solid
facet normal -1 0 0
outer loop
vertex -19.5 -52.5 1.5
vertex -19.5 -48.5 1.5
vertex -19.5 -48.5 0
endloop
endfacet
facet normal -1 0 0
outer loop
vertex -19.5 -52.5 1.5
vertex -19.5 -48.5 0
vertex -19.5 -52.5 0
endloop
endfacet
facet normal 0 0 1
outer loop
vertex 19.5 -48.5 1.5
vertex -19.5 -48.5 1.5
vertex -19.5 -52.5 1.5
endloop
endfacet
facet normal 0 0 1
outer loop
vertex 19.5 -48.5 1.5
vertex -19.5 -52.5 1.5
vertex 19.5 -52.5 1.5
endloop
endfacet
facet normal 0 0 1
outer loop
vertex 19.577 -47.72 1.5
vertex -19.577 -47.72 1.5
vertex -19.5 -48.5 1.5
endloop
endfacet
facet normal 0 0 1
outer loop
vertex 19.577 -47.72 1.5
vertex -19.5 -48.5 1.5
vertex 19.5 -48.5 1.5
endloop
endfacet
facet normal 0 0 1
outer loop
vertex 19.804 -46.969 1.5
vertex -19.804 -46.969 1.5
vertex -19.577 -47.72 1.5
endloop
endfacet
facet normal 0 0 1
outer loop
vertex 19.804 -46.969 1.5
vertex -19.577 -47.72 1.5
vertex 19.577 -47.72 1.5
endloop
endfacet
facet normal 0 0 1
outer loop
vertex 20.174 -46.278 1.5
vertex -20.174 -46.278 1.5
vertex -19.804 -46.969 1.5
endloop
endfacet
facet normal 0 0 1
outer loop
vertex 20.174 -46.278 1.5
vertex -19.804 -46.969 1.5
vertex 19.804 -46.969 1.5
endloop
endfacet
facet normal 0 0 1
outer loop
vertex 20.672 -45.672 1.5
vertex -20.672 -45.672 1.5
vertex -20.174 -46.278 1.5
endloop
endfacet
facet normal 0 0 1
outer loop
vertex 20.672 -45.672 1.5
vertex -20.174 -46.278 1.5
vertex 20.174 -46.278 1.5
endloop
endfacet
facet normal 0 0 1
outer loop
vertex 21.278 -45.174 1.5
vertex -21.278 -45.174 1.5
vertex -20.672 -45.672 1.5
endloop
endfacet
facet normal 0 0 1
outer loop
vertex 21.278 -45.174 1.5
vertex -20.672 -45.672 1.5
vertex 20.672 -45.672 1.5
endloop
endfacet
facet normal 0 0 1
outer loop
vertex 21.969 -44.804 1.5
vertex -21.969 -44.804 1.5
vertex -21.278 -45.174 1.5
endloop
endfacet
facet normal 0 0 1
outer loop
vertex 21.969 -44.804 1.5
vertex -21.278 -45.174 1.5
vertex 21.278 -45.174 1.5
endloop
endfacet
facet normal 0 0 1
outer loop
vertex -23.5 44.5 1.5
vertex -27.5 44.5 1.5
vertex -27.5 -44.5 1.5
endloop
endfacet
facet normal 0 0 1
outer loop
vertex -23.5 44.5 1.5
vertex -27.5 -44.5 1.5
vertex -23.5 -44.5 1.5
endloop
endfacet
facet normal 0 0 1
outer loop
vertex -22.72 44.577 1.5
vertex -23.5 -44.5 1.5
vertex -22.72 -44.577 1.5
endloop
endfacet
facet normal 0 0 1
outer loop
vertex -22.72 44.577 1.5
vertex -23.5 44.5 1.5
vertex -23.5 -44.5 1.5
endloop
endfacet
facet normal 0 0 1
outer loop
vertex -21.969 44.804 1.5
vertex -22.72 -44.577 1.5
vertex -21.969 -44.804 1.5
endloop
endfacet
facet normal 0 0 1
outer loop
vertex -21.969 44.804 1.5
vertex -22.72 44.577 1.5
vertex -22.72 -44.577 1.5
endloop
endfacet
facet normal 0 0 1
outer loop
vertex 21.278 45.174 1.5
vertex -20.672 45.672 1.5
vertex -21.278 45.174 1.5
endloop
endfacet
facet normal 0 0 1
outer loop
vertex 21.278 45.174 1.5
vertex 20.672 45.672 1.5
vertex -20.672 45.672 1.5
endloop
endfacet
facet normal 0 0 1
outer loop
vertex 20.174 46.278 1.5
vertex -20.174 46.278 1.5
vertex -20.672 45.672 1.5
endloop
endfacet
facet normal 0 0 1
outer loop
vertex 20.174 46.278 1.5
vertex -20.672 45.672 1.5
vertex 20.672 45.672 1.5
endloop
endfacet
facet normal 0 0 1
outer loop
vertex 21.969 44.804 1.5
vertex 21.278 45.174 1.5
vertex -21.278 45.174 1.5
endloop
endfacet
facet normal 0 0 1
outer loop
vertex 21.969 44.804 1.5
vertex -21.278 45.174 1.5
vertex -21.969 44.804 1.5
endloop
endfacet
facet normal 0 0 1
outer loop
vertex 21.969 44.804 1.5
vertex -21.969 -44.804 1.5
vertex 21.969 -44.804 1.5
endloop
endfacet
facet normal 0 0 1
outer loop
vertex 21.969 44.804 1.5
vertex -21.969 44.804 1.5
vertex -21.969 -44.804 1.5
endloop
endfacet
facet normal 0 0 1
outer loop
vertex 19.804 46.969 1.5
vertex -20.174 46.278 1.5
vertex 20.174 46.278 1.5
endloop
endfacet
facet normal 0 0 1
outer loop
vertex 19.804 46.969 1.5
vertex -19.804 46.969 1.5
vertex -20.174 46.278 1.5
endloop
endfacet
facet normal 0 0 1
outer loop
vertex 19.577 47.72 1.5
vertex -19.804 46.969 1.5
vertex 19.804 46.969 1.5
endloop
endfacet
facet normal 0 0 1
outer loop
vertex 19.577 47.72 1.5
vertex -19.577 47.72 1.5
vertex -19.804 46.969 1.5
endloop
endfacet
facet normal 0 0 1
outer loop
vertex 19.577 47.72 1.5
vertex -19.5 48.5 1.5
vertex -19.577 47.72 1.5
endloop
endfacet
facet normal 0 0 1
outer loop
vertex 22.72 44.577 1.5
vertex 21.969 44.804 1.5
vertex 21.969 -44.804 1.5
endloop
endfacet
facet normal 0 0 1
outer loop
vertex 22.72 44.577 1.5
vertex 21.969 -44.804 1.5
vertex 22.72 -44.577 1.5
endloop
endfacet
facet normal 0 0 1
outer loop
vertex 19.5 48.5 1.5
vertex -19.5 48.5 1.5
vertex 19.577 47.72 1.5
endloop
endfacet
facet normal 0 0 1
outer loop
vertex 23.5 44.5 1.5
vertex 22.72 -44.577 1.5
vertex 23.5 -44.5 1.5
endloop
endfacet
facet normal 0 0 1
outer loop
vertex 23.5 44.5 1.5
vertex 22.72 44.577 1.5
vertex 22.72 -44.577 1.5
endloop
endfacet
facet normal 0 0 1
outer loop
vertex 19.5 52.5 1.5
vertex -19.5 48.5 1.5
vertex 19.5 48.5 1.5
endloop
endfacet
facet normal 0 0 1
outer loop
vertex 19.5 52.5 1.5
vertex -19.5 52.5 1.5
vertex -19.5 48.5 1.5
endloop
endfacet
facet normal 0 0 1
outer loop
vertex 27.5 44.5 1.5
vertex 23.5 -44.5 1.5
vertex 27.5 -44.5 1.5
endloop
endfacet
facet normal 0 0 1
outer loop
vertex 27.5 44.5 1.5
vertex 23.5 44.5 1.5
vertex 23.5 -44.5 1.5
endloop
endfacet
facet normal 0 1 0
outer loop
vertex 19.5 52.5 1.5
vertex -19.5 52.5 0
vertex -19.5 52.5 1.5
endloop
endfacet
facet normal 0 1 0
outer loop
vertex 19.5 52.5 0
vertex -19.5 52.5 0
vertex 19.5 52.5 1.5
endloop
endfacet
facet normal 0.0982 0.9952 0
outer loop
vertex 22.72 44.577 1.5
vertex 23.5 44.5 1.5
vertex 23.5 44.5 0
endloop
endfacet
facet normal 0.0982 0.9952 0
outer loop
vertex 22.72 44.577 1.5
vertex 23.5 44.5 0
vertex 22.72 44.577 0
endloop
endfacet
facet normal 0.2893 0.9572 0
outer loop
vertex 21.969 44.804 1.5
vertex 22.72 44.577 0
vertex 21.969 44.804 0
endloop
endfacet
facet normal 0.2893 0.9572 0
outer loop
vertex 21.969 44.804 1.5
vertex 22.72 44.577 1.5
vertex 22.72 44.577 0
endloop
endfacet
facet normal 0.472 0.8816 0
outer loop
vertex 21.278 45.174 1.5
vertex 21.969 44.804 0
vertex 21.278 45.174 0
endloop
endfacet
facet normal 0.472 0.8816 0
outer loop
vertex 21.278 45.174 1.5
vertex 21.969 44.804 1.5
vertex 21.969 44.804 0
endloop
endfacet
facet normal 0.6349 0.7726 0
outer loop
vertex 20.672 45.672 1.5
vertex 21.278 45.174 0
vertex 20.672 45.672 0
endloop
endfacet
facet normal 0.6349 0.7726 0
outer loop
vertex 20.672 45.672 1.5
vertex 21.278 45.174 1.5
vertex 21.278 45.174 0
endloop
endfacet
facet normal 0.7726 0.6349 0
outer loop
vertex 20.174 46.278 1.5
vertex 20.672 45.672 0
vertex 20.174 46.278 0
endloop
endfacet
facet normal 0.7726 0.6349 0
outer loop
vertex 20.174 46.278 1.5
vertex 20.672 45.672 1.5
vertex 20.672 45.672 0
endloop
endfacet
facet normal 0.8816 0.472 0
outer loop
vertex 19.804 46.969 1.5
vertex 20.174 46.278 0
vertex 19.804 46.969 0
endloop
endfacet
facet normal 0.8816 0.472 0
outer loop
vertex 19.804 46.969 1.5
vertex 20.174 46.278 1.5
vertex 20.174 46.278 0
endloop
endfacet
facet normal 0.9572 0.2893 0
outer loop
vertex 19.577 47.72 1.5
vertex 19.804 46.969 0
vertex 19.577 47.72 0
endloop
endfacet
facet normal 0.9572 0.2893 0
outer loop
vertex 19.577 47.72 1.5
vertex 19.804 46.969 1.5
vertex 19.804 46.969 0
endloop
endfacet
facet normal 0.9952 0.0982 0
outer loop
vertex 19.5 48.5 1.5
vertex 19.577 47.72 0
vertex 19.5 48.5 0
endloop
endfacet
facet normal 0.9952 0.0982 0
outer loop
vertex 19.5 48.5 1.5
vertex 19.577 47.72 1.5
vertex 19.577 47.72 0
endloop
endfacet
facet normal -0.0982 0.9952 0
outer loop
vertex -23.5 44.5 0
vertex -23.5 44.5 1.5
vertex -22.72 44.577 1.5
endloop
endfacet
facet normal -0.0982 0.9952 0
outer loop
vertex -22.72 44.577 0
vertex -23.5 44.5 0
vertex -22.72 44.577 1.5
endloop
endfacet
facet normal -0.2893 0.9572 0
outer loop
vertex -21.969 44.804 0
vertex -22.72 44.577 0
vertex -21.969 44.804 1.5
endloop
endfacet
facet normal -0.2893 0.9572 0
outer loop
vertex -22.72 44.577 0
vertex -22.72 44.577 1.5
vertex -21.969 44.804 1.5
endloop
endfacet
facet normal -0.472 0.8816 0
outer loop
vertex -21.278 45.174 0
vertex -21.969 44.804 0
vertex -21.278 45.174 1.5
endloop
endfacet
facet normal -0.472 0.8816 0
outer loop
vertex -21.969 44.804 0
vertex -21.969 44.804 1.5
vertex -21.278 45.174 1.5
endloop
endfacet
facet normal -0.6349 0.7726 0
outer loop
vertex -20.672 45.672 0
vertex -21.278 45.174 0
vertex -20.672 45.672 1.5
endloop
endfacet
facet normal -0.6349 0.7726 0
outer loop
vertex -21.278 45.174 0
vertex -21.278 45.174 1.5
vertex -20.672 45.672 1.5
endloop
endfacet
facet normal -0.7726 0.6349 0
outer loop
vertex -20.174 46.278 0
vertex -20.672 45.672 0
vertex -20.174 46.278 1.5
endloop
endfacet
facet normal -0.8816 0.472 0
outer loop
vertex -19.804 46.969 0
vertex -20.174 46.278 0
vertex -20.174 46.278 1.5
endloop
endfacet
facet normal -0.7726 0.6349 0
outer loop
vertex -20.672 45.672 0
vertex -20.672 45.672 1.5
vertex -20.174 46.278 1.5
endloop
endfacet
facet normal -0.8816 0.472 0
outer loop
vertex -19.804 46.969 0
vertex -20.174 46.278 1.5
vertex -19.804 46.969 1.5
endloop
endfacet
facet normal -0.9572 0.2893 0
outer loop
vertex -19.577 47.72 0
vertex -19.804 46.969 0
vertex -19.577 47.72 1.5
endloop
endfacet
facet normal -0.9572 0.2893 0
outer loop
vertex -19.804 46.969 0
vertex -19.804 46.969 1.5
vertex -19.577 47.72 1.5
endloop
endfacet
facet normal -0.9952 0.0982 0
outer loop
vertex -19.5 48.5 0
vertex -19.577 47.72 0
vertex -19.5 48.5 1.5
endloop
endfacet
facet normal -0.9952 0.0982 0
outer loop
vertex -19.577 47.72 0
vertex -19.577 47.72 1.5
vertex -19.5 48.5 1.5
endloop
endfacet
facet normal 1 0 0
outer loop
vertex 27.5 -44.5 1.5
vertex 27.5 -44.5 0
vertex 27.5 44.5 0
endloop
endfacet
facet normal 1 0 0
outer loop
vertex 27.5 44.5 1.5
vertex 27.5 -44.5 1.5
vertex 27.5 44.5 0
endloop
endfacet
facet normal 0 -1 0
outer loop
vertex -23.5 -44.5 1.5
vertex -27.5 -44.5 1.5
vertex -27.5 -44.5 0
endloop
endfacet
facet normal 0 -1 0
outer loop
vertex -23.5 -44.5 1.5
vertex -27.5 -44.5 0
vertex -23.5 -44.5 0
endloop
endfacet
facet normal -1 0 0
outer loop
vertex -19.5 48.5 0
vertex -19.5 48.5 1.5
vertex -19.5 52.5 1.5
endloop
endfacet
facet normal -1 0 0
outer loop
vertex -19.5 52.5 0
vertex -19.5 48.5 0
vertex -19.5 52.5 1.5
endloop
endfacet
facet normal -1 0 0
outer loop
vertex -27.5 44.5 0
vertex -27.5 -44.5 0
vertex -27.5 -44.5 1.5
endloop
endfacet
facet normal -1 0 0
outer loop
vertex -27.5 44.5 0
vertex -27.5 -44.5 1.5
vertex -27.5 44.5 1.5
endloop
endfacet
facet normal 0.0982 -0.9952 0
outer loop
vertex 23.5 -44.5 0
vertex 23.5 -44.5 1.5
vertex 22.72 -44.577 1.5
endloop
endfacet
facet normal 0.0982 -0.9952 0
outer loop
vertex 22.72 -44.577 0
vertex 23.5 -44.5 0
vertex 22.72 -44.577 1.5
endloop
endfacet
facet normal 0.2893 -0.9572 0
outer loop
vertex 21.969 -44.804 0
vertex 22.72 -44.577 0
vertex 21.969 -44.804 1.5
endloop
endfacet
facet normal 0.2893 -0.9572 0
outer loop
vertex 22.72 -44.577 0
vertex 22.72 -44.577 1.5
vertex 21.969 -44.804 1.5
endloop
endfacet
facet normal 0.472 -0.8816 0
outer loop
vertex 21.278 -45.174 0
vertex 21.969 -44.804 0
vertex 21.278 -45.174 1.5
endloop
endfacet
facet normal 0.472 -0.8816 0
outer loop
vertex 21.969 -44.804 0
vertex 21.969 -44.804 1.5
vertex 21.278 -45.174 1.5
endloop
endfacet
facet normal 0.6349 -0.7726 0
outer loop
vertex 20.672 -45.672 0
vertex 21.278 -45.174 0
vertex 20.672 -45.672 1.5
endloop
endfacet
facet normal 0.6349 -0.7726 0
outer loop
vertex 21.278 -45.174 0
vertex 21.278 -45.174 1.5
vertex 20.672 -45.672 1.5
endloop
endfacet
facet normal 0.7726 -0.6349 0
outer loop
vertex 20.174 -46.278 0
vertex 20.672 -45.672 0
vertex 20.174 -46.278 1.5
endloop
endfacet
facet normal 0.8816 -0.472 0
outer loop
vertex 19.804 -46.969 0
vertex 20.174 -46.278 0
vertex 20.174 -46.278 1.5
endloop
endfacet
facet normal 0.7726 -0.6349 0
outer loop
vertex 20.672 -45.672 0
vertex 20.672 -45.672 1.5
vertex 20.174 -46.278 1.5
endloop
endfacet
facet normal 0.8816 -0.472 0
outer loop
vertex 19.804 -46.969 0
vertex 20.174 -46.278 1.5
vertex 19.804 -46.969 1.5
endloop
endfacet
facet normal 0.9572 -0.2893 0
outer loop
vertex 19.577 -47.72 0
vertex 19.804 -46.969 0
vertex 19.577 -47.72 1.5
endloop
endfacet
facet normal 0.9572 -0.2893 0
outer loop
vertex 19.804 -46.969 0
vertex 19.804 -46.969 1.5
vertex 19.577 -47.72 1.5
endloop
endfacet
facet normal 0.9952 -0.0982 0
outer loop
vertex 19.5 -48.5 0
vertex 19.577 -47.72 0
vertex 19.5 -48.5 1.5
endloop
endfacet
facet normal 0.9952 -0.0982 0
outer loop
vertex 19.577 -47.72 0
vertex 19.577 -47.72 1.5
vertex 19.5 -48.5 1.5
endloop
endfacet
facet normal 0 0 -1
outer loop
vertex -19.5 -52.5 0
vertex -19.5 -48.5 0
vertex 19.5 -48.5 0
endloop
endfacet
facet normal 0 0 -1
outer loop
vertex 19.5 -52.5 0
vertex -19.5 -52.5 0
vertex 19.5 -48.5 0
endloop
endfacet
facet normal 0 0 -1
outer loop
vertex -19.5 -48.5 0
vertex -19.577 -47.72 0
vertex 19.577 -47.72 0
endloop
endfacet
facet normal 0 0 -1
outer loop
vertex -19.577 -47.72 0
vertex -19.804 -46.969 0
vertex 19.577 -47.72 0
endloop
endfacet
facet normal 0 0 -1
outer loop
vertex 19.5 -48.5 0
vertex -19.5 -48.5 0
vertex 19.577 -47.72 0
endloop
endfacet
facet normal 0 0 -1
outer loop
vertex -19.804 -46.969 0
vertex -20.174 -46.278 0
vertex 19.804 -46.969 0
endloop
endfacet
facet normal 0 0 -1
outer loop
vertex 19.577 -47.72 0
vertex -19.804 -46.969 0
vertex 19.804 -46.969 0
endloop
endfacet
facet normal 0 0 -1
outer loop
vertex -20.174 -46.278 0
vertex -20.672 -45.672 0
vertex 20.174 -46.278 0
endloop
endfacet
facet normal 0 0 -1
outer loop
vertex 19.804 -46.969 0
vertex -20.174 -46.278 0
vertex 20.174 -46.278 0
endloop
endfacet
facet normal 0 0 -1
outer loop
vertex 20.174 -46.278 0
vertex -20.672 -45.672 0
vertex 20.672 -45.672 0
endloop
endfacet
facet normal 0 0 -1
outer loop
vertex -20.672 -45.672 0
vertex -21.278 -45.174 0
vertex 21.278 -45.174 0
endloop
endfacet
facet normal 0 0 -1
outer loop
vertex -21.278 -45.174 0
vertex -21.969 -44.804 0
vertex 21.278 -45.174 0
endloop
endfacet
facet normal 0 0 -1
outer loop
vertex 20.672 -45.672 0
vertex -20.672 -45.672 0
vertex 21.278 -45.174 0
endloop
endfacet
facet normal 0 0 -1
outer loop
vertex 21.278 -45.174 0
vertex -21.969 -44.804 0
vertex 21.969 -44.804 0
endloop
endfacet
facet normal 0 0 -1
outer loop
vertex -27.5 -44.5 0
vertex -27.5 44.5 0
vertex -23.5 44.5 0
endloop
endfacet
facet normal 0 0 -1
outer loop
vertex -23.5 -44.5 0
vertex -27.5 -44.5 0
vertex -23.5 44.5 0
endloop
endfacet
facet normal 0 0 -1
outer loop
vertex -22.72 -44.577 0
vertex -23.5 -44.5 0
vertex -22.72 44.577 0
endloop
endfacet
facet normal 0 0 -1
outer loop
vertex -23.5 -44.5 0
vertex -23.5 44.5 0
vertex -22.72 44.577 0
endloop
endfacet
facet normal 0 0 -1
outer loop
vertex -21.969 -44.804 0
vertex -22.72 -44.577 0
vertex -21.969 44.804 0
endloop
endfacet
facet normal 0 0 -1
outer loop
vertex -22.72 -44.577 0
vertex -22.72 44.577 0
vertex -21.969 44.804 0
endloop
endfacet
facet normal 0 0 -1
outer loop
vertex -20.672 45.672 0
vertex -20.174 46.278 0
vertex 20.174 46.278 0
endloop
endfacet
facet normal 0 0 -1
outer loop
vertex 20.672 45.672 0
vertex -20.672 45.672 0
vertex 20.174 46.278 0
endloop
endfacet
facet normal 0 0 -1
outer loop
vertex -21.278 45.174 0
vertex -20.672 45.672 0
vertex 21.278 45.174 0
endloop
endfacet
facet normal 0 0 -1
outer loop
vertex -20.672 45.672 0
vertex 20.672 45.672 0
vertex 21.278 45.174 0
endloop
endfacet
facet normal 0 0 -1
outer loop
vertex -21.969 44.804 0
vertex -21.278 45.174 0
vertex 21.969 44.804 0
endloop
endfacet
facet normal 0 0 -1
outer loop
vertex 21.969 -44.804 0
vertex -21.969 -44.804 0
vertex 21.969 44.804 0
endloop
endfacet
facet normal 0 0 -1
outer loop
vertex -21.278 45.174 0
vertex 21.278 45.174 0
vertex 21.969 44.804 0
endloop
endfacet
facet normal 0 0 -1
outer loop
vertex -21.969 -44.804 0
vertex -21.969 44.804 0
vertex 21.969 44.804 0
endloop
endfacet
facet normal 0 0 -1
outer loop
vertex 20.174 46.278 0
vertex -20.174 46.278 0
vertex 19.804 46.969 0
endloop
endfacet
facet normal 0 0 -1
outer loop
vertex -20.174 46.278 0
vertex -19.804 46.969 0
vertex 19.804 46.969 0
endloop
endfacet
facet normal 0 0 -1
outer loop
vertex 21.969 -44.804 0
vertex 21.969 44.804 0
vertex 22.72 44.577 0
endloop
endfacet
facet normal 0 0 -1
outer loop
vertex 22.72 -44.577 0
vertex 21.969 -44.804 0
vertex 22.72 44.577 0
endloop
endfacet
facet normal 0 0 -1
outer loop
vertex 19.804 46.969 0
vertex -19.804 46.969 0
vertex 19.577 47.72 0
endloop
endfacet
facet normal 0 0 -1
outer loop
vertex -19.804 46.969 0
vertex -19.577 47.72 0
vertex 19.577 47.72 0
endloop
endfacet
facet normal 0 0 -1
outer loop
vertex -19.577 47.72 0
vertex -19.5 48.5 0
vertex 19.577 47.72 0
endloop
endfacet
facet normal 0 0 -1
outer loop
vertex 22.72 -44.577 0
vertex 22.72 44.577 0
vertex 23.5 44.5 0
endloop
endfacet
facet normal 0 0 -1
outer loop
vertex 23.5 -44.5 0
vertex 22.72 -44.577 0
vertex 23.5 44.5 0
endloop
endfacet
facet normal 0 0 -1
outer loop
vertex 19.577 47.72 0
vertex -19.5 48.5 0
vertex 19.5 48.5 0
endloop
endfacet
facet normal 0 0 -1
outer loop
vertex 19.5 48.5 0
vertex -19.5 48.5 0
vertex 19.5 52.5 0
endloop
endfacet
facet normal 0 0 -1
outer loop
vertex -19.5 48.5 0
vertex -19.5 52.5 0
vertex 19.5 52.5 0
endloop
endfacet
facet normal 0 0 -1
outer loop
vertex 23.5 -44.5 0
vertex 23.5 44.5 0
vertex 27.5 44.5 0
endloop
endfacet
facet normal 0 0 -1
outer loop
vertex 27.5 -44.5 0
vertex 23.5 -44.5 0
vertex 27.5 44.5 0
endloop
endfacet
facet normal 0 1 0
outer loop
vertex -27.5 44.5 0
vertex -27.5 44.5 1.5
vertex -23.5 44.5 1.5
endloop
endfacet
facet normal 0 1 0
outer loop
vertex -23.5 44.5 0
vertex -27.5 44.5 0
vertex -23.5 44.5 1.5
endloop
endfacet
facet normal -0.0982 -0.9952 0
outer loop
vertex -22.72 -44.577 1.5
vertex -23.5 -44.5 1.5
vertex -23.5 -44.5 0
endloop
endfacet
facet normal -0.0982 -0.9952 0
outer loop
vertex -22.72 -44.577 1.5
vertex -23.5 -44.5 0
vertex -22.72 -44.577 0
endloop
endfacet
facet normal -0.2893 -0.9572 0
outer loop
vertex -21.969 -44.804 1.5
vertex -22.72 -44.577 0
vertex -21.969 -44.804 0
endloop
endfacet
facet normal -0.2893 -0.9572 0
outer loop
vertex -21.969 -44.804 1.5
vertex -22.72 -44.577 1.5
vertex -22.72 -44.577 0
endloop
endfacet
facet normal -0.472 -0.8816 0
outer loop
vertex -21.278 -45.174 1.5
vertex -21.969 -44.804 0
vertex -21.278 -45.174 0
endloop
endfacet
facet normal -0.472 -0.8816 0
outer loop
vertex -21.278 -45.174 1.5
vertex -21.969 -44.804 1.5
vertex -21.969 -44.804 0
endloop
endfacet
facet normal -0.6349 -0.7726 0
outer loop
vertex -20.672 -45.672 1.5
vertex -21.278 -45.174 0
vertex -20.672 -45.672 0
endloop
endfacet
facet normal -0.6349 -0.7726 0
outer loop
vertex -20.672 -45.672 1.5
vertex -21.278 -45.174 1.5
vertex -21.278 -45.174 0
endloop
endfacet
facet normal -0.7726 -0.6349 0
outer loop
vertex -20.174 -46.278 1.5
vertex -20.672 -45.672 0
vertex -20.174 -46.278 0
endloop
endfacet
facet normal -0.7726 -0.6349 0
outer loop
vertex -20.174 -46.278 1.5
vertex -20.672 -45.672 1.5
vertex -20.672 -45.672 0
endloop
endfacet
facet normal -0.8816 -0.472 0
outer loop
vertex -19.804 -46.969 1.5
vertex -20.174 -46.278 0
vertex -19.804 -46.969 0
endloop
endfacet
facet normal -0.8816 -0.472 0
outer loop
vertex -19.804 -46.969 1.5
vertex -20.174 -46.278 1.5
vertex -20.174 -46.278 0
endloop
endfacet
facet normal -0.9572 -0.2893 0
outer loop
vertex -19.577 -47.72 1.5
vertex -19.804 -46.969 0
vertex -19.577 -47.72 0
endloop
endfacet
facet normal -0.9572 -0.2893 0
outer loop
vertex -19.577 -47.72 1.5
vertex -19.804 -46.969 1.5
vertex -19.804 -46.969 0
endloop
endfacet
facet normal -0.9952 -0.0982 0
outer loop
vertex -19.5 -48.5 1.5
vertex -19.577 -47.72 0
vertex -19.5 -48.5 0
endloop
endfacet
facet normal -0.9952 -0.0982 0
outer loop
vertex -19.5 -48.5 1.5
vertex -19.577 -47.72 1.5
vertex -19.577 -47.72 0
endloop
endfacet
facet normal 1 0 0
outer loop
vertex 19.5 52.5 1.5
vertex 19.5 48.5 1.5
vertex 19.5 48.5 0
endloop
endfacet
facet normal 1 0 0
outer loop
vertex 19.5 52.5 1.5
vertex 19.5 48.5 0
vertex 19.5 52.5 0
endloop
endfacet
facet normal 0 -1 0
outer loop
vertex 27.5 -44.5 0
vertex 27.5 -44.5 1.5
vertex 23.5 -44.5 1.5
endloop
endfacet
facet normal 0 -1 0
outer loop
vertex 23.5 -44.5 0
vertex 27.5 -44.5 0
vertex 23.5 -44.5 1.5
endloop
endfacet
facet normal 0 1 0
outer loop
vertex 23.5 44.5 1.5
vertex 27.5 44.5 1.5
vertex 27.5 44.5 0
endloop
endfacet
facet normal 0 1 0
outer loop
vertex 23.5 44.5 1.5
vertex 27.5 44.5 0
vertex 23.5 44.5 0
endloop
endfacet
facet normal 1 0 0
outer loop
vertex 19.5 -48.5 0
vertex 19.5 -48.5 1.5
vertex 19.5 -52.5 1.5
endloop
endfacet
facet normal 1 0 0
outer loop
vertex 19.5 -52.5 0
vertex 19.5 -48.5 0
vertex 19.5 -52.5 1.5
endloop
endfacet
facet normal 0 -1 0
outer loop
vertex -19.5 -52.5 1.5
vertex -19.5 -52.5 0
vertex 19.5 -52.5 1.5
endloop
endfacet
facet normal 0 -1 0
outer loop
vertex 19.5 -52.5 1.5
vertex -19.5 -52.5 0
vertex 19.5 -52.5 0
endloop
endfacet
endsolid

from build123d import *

# Parameters (mm, degrees)
CROQUIS1_W              = 55
CROQUIS1_H              = 105
SALIENTE_EXTRUIR1_DEPTH = 1.5
CORTAR_EXTRUIR1_REACH   = 61.285


with BuildPart() as part:
    # Croquis1 → Saliente-Extruir1 (new body)
    with BuildSketch(Plane.XY):
        Rectangle(CROQUIS1_W, CROQUIS1_H)
    extrude(amount=SALIENTE_EXTRUIR1_DEPTH)

    # Croquis2 → Cortar-Extruir1 (cut, up to next)
    with BuildSketch(Plane.XY.offset(1.5), mode=Mode.PRIVATE) as cortar_extruir1_sk1:
        with BuildLine():
            Line((-19.5, -48.5), (-19.5, -52.5))
            Line((-19.5, -52.5), (-27.5, -52.5))
            Line((-27.5, -52.5), (-27.5, -44.5))
            Line((-27.5, -44.5), (-23.5, -44.5))
            ThreePointArc((-23.5, -44.5), (-20.671572875, -45.671572875), (-19.5, -48.5))
        make_face()
    cortar_extruir1_tool1 = extrude(cortar_extruir1_sk1.sketch, amount=-CORTAR_EXTRUIR1_REACH, mode=Mode.PRIVATE) & part.part
    # Croquis2 → Cortar-Extruir1 (cut, up to next)
    with BuildSketch(Plane.XY.offset(1.5), mode=Mode.PRIVATE) as cortar_extruir1_sk2:
        with BuildLine():
            Line((19.5, -48.5), (19.5, -52.5))
            Line((19.5, -52.5), (27.5, -52.5))
            Line((27.5, -52.5), (27.5, -44.5))
            Line((27.5, -44.5), (23.5, -44.5))
            ThreePointArc((23.5, -44.5), (20.671572875, -45.671572875), (19.5, -48.5))
        make_face()
    cortar_extruir1_tool2 = extrude(cortar_extruir1_sk2.sketch, amount=-CORTAR_EXTRUIR1_REACH, mode=Mode.PRIVATE) & part.part
    # Croquis2 → Cortar-Extruir1 (cut, up to next)
    with BuildSketch(Plane.XY.offset(1.5), mode=Mode.PRIVATE) as cortar_extruir1_sk3:
        with BuildLine():
            Line((19.5, 48.5), (19.5, 52.5))
            Line((19.5, 52.5), (27.5, 52.5))
            Line((27.5, 52.5), (27.5, 44.5))
            Line((27.5, 44.5), (23.5, 44.5))
            ThreePointArc((23.5, 44.5), (20.671572875, 45.671572875), (19.5, 48.5))
        make_face()
    cortar_extruir1_tool3 = extrude(cortar_extruir1_sk3.sketch, amount=-CORTAR_EXTRUIR1_REACH, mode=Mode.PRIVATE) & part.part
    # Croquis2 → Cortar-Extruir1 (cut, up to next)
    with BuildSketch(Plane.XY.offset(1.5), mode=Mode.PRIVATE) as cortar_extruir1_sk4:
        with BuildLine():
            Line((-19.5, 48.5), (-19.5, 52.5))
            Line((-19.5, 52.5), (-27.5, 52.5))
            Line((-27.5, 52.5), (-27.5, 44.5))
            Line((-27.5, 44.5), (-23.5, 44.5))
            ThreePointArc((-23.5, 44.5), (-20.671572875, 45.671572875), (-19.5, 48.5))
        make_face()
    cortar_extruir1_tool4 = extrude(cortar_extruir1_sk4.sketch, amount=-CORTAR_EXTRUIR1_REACH, mode=Mode.PRIVATE) & part.part
    add(cortar_extruir1_tool1.solids().sort_by_distance((-23.676115, -48.676115, 1.5))[0], mode=Mode.SUBTRACT)
    add(cortar_extruir1_tool2.solids().sort_by_distance((23.676115, -48.676115, 1.5))[0], mode=Mode.SUBTRACT)
    add(cortar_extruir1_tool3.solids().sort_by_distance((23.676115, 48.676115, 1.5))[0], mode=Mode.SUBTRACT)
    add(cortar_extruir1_tool4.solids().sort_by_distance((-23.676115, 48.676115, 1.5))[0], mode=Mode.SUBTRACT)


solid = part.part
